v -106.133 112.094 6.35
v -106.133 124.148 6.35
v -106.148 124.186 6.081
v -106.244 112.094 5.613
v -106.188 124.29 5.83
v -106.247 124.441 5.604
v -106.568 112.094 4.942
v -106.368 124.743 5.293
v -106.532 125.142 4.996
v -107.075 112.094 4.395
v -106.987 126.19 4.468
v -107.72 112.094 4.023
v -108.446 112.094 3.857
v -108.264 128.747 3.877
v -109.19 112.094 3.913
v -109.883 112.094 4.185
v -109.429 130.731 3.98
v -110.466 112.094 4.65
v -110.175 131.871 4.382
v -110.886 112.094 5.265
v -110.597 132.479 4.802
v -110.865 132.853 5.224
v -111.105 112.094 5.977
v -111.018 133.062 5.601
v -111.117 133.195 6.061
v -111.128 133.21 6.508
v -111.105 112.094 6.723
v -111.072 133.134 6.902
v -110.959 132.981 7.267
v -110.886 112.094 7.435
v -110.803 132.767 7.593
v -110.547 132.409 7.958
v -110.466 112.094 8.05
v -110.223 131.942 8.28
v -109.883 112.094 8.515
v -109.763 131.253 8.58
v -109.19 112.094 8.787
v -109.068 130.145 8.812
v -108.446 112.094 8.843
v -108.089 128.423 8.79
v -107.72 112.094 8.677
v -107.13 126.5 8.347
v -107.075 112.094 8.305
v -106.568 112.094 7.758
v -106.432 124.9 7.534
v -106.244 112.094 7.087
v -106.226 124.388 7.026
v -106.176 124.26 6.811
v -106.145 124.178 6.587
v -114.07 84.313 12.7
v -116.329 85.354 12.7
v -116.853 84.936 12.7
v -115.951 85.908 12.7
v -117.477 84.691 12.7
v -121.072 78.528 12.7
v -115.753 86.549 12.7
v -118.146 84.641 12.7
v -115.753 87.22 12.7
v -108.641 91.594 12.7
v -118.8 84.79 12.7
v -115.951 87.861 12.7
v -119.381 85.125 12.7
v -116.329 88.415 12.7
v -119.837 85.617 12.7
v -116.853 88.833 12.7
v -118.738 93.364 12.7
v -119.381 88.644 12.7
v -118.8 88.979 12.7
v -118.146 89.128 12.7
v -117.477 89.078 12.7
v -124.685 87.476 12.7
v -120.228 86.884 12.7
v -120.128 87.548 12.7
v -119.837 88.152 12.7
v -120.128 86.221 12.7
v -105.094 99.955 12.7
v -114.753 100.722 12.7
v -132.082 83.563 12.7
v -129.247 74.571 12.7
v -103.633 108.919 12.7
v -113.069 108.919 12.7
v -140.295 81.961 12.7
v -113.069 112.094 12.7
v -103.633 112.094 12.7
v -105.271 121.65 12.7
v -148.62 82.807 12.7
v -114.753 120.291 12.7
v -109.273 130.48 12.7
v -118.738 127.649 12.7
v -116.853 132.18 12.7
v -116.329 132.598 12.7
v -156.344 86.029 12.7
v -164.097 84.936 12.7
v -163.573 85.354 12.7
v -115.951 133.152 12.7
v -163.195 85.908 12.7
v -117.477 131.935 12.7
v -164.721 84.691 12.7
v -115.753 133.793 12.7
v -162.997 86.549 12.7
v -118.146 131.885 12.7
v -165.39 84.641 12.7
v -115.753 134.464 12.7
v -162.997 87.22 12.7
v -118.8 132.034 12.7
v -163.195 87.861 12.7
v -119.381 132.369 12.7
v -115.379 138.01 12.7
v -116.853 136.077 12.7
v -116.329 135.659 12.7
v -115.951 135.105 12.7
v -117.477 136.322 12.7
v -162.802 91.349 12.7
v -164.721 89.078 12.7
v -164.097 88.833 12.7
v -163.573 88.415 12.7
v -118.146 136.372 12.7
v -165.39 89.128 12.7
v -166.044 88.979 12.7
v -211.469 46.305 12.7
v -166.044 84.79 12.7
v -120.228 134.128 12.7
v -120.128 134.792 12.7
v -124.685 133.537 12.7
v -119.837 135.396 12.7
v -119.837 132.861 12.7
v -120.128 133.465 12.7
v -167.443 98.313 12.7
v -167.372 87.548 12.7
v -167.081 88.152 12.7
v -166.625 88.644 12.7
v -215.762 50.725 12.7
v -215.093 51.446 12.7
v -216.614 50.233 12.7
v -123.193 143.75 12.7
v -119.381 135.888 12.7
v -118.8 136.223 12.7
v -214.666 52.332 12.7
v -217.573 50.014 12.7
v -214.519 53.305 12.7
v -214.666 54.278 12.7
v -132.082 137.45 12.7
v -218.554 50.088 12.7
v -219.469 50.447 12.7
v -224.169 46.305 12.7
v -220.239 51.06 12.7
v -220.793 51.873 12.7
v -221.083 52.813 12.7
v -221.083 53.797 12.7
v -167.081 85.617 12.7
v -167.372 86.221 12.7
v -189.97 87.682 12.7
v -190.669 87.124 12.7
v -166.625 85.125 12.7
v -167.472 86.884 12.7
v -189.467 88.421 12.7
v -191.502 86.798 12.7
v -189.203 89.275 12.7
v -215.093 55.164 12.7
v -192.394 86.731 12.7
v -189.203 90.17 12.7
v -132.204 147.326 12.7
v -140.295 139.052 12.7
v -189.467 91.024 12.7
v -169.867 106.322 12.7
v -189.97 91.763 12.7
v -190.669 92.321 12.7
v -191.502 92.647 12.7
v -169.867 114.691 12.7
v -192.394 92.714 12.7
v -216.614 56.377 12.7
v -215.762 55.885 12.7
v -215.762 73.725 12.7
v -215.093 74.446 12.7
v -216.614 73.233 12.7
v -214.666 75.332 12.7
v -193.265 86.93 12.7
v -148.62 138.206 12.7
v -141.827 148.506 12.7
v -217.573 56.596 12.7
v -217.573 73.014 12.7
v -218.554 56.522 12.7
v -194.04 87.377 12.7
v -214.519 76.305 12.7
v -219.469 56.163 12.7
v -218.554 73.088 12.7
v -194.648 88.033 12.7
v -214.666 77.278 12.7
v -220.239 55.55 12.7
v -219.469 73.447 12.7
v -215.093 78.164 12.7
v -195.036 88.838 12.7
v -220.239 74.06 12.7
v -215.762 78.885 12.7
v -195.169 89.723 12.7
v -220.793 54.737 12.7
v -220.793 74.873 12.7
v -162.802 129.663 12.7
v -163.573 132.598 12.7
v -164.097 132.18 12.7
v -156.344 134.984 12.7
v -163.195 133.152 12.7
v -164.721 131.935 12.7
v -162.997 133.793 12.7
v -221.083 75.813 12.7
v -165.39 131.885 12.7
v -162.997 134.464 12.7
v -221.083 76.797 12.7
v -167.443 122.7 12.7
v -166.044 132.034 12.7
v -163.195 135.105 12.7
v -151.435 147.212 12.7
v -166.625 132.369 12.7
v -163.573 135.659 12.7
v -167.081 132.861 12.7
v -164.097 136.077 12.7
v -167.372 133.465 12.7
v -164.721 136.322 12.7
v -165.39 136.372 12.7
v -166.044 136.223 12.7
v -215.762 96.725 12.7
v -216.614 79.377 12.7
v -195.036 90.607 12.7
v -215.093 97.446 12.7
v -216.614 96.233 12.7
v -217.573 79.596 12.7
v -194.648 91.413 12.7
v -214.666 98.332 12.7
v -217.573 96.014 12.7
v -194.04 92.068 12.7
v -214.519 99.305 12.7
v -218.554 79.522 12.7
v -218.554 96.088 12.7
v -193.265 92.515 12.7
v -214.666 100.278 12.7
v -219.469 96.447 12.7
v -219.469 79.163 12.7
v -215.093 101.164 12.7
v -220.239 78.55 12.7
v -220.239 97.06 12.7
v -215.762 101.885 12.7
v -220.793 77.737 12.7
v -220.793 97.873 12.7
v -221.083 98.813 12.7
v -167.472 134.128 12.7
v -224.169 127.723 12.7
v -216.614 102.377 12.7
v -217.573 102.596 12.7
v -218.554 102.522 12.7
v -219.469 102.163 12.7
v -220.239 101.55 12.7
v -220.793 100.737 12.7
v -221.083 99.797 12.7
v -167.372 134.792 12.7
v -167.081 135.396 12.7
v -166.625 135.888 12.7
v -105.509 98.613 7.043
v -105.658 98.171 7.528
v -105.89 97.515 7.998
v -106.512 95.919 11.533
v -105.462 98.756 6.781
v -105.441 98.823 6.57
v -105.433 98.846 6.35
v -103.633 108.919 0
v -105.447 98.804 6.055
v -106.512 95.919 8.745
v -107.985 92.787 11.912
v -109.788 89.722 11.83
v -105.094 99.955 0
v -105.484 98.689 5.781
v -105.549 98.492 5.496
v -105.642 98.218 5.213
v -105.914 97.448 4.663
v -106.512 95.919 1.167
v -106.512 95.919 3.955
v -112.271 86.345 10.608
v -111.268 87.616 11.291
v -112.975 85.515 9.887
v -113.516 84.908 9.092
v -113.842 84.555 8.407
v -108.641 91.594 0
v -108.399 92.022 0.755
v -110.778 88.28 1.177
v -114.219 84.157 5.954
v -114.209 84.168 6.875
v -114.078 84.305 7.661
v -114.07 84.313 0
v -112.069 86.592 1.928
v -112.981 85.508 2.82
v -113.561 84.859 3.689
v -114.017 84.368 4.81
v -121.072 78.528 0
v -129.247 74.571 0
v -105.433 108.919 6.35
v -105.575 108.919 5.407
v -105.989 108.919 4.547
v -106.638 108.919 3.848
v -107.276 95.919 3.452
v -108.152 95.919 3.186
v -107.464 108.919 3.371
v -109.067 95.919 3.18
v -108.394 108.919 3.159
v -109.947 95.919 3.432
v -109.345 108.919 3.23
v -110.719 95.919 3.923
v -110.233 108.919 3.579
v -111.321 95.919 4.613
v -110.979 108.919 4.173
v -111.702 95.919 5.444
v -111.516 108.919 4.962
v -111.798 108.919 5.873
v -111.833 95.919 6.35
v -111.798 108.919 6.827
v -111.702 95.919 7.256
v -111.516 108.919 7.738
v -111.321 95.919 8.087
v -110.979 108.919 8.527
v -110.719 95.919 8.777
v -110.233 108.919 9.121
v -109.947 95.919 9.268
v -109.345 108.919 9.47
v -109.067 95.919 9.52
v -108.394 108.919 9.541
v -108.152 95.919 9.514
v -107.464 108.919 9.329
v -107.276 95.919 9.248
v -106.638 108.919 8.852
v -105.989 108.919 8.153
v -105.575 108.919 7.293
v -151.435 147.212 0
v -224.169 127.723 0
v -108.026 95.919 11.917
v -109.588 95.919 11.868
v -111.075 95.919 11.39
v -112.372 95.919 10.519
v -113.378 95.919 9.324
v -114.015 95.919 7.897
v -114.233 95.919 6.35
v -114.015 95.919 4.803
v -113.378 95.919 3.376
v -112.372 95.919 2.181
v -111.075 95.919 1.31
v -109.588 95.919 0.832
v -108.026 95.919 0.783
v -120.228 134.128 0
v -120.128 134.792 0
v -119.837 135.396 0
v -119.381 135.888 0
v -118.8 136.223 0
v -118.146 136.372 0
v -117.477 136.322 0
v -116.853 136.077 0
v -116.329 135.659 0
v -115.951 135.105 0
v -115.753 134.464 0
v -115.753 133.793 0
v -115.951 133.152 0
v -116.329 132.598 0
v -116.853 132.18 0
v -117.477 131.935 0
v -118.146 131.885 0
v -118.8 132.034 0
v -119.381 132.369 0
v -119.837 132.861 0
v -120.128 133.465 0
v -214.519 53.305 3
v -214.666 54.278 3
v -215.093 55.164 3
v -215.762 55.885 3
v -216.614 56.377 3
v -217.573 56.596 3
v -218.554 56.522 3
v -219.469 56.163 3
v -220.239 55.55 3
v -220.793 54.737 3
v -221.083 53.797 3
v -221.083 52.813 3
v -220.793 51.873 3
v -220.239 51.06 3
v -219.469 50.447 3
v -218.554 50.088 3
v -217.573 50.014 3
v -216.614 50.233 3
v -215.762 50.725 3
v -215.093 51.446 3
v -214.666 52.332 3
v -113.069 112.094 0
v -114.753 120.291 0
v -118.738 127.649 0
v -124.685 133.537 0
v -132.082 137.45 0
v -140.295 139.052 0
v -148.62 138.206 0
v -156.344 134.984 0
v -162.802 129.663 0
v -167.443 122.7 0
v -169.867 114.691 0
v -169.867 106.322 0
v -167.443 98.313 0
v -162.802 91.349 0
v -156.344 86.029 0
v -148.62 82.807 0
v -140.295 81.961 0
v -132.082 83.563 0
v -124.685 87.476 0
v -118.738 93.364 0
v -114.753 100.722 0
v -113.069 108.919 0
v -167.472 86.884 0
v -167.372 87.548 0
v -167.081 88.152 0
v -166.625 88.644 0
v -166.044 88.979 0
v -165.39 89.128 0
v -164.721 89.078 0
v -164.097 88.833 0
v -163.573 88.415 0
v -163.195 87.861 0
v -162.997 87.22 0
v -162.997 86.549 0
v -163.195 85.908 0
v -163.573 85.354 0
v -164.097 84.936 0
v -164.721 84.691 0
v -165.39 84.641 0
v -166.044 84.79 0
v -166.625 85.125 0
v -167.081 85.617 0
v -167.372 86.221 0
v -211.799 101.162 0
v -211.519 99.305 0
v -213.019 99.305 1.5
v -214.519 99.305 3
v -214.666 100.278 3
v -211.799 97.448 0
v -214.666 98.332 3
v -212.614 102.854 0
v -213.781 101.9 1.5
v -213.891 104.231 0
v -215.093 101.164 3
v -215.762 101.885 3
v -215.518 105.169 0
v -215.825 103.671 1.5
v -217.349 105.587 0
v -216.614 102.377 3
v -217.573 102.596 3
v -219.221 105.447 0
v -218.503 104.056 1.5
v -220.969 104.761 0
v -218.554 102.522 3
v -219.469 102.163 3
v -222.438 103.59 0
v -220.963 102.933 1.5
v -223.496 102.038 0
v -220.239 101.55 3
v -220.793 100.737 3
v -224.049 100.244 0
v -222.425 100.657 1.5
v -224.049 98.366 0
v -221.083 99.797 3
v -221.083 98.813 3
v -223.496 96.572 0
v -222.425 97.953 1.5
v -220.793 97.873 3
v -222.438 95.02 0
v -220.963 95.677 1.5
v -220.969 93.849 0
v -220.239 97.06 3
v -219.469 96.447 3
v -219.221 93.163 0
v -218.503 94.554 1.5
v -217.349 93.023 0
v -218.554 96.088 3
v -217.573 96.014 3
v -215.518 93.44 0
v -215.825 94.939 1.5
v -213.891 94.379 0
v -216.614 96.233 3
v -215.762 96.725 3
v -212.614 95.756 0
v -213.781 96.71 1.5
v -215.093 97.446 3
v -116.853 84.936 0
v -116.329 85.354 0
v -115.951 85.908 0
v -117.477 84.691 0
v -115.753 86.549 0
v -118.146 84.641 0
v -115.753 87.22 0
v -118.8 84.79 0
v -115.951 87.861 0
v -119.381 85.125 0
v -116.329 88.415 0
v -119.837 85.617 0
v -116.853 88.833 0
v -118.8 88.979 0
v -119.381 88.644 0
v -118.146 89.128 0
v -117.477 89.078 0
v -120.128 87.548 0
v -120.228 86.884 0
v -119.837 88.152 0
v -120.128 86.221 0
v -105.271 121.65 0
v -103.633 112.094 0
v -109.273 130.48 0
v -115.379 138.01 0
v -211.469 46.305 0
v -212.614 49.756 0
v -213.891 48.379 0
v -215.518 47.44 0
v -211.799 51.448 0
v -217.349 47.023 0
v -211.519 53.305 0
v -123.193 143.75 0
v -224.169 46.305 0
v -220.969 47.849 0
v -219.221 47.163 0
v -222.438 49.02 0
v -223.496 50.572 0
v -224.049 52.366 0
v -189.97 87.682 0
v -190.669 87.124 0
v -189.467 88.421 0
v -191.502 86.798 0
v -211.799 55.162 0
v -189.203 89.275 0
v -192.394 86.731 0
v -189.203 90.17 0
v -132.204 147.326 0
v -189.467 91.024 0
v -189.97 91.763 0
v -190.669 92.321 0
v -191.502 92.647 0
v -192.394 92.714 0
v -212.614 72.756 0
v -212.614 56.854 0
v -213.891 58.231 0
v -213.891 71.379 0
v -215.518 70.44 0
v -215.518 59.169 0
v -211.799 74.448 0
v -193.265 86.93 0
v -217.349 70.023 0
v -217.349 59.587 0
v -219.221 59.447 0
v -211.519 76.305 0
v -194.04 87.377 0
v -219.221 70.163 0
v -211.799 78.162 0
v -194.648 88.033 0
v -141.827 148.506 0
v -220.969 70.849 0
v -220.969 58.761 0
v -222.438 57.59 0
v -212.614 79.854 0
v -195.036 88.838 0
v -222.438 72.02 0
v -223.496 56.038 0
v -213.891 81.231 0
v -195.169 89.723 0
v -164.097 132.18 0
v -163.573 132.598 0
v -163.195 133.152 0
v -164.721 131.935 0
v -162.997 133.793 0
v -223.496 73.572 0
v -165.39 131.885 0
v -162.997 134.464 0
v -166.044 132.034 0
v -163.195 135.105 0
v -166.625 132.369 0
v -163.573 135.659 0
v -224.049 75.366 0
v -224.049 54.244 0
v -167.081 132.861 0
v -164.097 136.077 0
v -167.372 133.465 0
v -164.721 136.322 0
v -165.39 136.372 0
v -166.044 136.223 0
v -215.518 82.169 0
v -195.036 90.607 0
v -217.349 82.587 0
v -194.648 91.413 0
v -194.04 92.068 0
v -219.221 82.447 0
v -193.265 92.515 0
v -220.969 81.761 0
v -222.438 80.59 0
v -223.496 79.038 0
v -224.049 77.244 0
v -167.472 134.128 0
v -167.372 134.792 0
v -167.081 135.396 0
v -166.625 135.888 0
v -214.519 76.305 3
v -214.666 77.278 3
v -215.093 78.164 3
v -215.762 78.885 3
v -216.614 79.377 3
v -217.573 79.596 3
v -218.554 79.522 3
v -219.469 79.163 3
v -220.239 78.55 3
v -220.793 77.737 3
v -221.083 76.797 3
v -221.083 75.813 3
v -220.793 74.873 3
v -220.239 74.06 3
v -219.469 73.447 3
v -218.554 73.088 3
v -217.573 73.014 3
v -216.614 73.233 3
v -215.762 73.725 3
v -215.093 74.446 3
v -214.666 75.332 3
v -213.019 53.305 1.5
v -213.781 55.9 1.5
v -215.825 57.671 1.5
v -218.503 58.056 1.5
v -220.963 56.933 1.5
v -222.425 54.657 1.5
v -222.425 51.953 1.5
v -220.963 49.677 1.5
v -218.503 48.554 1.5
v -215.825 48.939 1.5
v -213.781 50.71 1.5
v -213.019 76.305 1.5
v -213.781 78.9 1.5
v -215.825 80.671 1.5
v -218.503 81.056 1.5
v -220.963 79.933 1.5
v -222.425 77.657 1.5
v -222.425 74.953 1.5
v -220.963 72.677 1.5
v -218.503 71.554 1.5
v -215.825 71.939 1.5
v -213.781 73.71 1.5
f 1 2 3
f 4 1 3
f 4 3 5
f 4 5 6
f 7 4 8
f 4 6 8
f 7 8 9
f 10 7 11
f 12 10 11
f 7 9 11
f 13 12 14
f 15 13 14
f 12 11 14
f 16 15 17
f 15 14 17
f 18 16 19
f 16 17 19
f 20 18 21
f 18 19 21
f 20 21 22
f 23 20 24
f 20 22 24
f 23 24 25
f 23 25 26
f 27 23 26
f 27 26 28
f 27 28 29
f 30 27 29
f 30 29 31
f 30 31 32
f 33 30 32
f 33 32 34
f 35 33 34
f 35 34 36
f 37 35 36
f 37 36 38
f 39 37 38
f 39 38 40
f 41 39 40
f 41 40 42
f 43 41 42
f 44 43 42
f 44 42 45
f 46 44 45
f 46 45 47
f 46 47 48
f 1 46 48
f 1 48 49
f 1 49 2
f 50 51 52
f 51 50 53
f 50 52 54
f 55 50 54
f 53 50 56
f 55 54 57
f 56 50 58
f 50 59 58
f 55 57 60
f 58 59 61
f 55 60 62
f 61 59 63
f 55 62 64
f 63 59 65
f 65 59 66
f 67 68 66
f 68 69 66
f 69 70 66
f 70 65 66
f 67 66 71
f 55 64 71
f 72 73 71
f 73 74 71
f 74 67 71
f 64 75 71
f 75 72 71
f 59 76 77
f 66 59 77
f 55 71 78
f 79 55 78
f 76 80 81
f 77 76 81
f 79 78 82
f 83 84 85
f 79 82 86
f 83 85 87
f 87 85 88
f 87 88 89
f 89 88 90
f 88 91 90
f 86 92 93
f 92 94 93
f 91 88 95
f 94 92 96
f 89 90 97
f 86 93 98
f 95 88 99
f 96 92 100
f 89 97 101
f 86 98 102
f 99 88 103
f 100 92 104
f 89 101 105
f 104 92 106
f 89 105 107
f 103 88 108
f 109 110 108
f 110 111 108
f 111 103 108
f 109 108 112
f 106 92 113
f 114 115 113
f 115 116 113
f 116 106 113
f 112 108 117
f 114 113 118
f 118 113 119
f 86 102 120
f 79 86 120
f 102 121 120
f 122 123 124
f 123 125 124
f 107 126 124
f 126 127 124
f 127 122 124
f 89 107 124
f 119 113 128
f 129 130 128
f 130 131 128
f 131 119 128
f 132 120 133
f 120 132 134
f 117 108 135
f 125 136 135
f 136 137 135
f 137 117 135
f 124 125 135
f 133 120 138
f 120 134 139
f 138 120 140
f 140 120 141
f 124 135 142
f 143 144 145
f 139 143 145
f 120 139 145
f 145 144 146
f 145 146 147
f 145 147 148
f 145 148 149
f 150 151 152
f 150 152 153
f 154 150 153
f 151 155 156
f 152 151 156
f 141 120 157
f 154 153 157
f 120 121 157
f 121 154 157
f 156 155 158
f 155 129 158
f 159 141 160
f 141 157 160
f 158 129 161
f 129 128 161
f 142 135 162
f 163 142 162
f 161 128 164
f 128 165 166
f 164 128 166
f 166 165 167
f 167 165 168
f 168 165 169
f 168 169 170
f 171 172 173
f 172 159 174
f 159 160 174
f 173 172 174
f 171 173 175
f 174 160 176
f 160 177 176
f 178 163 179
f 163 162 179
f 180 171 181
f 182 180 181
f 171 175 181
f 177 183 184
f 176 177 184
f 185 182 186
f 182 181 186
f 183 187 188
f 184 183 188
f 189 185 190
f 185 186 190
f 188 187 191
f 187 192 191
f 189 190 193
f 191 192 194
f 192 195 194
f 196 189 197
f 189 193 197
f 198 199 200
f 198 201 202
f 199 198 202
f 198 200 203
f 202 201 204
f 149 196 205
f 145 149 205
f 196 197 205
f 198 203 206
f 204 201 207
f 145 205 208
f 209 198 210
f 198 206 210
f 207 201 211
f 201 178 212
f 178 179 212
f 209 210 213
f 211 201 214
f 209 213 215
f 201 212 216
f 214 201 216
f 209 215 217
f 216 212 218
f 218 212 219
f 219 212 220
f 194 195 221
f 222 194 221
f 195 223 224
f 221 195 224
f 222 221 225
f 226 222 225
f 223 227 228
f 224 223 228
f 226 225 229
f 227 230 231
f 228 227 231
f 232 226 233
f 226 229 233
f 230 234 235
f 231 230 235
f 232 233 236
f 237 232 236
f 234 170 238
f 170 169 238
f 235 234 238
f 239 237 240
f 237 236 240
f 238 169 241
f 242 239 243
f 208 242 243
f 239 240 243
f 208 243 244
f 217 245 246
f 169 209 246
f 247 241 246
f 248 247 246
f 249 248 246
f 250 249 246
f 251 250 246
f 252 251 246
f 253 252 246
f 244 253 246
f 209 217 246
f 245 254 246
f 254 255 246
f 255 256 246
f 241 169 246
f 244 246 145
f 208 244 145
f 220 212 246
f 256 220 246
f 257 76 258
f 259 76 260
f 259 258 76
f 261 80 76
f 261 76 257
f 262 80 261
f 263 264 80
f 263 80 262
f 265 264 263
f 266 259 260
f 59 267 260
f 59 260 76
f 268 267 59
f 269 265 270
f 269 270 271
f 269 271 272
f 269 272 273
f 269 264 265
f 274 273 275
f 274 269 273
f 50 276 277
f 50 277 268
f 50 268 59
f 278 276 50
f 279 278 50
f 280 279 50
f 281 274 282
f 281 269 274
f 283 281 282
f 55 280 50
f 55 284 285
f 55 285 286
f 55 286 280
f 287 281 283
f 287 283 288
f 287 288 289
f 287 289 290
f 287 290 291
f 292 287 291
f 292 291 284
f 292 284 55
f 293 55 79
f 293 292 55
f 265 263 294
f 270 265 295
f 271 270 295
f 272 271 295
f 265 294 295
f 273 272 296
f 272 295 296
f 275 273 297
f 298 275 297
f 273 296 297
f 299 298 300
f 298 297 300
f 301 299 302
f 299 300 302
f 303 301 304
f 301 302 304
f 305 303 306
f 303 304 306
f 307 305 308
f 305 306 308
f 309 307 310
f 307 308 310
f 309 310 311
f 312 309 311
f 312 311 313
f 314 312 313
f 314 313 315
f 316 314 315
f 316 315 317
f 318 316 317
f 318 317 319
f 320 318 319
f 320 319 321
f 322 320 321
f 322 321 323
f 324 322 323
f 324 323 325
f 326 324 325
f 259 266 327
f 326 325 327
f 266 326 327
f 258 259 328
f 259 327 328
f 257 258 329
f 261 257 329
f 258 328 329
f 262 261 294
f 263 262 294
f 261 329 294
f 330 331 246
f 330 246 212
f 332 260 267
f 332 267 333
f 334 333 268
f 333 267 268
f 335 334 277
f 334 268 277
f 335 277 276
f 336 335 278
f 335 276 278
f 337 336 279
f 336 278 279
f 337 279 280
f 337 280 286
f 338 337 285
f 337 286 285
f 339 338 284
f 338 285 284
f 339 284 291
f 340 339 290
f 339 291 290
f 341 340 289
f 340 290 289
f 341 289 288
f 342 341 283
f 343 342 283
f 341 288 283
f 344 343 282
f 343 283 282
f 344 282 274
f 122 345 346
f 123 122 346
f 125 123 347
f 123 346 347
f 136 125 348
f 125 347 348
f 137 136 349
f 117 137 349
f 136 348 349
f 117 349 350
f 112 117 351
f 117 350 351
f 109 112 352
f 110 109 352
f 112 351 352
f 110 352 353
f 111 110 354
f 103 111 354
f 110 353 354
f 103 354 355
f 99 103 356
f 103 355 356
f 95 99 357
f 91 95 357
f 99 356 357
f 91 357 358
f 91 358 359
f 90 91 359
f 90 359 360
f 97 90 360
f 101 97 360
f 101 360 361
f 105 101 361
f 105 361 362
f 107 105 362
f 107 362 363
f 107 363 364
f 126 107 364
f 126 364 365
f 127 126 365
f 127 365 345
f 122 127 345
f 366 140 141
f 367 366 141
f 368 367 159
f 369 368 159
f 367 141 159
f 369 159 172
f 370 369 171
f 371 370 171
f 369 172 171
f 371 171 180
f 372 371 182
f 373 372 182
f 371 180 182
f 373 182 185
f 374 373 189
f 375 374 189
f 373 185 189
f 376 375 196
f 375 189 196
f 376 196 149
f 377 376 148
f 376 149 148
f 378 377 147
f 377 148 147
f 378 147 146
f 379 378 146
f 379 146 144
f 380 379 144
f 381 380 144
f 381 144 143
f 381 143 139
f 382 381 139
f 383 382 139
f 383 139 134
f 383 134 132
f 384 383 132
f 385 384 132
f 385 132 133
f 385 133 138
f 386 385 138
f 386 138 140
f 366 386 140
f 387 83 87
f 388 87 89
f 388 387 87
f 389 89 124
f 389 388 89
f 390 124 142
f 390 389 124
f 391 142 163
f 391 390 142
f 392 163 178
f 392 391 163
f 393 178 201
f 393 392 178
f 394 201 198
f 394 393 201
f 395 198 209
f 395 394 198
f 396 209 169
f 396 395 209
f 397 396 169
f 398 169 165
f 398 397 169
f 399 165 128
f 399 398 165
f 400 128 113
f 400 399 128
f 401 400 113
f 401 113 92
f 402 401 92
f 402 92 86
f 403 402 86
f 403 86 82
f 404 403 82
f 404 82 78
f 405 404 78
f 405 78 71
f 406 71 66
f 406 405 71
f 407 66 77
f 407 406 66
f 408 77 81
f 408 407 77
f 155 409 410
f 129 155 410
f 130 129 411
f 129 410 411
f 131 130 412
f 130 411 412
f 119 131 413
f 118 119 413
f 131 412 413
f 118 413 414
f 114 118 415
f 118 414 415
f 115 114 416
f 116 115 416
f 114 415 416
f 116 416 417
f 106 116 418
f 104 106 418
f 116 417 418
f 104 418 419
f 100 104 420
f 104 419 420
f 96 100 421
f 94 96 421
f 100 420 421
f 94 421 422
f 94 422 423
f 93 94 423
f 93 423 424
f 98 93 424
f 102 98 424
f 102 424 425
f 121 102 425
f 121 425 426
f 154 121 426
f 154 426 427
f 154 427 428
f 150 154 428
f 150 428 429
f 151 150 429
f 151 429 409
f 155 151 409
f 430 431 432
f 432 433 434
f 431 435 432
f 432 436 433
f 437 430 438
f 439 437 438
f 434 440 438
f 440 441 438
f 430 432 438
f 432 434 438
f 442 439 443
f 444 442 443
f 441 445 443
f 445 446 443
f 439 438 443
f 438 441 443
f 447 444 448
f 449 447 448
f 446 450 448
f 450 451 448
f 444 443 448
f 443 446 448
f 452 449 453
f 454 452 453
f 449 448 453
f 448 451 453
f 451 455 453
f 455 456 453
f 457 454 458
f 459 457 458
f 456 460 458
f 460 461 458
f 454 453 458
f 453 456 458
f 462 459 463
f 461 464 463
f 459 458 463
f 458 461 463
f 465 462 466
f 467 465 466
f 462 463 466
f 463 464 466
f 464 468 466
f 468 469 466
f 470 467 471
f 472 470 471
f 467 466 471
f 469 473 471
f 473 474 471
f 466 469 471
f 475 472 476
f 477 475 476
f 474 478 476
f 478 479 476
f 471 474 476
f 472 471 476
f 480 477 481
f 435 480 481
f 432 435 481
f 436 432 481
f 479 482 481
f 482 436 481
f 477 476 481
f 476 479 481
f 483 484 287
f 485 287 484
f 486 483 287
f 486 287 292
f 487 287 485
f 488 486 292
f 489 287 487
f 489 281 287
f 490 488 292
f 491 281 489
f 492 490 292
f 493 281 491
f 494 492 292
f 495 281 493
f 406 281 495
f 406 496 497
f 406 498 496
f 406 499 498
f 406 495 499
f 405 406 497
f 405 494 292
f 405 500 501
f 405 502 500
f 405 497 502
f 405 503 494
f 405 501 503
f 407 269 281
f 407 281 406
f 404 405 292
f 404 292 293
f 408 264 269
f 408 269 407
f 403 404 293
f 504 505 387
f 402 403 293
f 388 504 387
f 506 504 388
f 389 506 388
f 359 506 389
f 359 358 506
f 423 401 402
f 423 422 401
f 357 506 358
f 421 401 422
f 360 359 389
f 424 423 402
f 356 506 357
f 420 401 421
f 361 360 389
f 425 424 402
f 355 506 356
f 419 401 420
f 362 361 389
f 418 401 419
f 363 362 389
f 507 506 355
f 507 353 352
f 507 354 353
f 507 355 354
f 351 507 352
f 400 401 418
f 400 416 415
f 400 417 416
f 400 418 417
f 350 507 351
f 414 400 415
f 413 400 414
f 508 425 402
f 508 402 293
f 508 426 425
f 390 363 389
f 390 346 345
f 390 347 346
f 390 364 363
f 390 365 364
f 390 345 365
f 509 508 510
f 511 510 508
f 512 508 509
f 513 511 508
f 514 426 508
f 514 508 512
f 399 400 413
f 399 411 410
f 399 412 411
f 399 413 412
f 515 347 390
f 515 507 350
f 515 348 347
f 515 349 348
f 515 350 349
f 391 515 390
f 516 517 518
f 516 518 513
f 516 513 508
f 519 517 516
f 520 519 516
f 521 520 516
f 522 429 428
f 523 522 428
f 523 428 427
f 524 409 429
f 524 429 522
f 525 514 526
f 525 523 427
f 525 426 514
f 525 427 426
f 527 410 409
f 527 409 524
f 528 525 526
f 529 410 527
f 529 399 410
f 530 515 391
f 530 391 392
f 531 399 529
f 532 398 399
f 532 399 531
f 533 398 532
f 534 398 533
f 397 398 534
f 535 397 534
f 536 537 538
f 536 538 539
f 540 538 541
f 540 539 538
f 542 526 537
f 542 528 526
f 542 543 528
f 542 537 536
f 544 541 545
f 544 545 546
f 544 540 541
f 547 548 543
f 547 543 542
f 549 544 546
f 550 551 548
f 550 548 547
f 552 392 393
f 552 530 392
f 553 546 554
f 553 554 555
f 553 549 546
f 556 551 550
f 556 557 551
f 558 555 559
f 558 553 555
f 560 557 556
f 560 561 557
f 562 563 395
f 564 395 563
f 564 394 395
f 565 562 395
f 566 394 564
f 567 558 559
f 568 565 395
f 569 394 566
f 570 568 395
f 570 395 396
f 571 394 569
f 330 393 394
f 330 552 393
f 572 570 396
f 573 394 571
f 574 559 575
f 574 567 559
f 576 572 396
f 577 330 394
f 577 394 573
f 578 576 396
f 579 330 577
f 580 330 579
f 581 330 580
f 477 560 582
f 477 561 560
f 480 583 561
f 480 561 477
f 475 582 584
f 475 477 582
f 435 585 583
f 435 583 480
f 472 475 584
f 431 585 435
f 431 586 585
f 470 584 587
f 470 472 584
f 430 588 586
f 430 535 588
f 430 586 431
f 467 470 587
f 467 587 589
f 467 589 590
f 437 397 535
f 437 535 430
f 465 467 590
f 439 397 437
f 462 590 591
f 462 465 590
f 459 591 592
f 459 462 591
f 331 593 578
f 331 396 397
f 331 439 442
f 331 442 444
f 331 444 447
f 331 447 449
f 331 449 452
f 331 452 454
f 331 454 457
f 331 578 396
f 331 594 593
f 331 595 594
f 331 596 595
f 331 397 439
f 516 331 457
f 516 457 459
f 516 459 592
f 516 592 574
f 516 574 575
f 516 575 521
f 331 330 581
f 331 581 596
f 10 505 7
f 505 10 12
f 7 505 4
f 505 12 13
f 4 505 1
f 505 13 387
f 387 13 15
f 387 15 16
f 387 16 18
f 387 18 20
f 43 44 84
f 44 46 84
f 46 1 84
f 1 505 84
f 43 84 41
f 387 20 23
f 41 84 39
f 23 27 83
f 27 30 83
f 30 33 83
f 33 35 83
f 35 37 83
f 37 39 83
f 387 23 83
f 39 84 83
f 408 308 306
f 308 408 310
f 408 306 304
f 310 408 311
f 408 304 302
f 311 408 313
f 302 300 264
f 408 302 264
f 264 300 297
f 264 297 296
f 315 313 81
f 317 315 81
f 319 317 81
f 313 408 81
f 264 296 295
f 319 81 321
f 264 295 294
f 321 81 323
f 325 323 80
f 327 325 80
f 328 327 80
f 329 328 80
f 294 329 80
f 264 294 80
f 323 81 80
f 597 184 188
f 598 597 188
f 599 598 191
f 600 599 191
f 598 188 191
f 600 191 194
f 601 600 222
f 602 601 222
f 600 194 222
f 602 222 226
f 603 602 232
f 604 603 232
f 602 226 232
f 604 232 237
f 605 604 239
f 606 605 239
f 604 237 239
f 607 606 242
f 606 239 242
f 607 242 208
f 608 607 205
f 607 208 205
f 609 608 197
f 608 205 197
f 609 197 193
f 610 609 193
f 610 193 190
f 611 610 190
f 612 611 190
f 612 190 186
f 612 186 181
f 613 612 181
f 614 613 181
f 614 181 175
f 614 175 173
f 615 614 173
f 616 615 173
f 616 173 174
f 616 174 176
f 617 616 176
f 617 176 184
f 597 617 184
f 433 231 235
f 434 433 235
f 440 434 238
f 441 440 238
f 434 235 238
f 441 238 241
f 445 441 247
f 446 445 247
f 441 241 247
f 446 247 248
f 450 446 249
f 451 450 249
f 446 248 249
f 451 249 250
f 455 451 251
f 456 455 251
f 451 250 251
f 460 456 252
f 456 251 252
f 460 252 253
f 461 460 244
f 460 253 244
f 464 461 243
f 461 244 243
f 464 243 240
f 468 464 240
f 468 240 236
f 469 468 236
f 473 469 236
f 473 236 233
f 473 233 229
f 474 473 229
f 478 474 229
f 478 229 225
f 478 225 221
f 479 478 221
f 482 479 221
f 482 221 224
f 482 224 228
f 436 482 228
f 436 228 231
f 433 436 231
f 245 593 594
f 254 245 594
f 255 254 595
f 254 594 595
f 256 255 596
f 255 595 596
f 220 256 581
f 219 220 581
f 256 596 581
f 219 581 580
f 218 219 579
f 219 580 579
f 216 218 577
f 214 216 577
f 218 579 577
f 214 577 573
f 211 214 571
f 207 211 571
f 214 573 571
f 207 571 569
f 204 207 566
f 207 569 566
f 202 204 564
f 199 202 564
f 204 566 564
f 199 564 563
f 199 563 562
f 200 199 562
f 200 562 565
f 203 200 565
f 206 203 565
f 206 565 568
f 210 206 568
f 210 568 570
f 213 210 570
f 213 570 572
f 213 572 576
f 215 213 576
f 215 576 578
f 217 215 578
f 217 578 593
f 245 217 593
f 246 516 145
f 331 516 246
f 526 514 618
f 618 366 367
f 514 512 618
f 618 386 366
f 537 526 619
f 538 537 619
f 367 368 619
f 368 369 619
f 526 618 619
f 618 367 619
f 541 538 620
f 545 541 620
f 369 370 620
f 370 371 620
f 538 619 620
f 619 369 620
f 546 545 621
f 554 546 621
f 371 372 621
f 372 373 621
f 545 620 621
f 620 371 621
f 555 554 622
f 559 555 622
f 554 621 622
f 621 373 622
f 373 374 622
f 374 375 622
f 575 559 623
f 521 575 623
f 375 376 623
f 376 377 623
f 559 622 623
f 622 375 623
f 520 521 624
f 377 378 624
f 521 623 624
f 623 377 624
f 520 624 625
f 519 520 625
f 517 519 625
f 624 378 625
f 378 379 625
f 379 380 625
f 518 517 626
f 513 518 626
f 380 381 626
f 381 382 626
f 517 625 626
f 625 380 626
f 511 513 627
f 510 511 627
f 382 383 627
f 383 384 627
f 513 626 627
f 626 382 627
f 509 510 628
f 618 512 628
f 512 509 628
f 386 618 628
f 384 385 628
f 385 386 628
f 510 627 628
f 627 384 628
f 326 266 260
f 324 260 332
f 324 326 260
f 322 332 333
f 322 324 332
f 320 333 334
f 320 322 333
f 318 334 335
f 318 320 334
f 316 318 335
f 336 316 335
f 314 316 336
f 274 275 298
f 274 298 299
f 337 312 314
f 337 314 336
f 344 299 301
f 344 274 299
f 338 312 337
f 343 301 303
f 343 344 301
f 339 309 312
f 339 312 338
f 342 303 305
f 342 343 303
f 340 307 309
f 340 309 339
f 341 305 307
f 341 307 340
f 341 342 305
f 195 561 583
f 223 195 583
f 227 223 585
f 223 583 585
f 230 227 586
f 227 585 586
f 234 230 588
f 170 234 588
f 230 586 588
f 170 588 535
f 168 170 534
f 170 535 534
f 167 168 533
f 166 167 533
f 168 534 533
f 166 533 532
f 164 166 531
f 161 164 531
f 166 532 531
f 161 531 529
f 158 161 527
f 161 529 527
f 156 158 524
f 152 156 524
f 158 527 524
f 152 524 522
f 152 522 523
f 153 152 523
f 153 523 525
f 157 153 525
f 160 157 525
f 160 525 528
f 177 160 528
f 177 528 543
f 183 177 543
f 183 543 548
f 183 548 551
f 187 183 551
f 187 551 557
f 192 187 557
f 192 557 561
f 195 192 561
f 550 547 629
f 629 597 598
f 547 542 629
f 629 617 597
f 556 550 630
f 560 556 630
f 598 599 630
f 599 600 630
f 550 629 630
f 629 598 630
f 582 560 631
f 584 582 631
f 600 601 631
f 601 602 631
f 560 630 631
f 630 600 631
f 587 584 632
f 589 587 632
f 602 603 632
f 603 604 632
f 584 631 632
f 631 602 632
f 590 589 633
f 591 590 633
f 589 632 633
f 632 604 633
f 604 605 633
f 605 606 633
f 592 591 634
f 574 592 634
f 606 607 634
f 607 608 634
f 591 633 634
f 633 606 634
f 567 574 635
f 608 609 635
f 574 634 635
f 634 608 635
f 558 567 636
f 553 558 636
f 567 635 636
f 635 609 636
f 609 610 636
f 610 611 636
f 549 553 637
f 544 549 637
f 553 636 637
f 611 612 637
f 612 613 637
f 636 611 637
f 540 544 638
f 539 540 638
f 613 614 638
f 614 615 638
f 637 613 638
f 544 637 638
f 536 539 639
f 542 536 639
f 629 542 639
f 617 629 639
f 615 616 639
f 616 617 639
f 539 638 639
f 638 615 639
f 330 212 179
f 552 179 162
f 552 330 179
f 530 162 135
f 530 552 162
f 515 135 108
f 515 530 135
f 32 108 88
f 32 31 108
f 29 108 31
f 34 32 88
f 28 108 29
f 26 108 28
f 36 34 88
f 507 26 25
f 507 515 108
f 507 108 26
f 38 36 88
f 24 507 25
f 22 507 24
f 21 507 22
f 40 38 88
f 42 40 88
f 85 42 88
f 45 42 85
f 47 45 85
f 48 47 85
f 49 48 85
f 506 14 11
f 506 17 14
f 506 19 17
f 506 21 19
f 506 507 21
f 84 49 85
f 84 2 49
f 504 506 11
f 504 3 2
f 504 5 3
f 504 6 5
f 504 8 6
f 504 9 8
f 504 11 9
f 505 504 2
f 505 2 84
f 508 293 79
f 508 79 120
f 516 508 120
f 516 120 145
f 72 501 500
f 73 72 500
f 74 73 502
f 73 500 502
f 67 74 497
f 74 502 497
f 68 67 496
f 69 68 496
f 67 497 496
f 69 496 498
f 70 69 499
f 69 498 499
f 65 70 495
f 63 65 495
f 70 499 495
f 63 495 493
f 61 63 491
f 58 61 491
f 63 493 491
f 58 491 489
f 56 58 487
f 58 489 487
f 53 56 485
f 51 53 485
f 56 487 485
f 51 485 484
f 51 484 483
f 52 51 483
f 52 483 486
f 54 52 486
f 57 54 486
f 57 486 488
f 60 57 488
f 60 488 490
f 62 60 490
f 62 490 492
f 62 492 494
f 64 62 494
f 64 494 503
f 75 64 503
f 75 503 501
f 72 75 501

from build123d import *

# Parameters (mm, degrees)
BOSS_EXTRUDE1_DEPTH         = 12.7
CUT_EXTRUDE1_DEPTH          = 13.7
SKETCH3_W                   = 28.575
SKETCH3_H                   = 12.7
F_8_CLEARANCE_HOLE1_D       = 4.5
F_8_CLEARANCE_HOLE1_DEPTH   = 12.7
F_1_4_CLEARANCE_HOLE1_D     = 6.6
F_1_4_CLEARANCE_HOLE1_DEPTH = 12.7
F_12_CLEARANCE_HOLE1_D      = 6
F_12_CLEARANCE_HOLE1_DEPTH  = 12.7
HOLE1_D                     = 6.4
HOLE1_DEPTH                 = 24.77643101
HOLE1_CBORE_D               = 11.2
HOLE1_CBORE_DEPTH           = 11.77643101
F_10_CLEARANCE_HOLE1_D      = 5
F_10_CLEARANCE_HOLE1_DEPTH  = 36.4125
CHAMFER1_SIZE               = 3
SKETCH14_R                  = 4
SKETCH14_R_2                = 3
BOSS_EXTRUDE2_DEPTH         = 12.7


with BuildPart() as part:
    # Sketch1 → Boss-Extrude1 (new body)
    with BuildSketch(Plane(origin=(0, 0, 0), x_dir=(-1, 0, 0), z_dir=(0, 0, -1))):
        with BuildLine():
            Line((224.169455465, 127.72254562), (151.435240745, 147.211619716))
            ThreePointArc((151.435240745, 147.211619716), (105.257753851, 121.607458019), (129.246532787, 74.570537656))
            Line((129.246532787, 74.570537656), (211.469455465, 46.304993078))
            Line((211.469455465, 46.304993078), (224.169455465, 46.304993078))
            Line((224.169455465, 46.304993078), (224.169455465, 127.72254562))
        make_face()
    extrude(amount=-BOSS_EXTRUDE1_DEPTH)

    # Sketch2 → Cut-Extrude1 (cut, through all)
    with BuildSketch(Plane.XY.offset(12.7)):
        with BuildLine():
            Line((-103.633291463, 112.093938317), (-113.179018515, 112.093938317))
            ThreePointArc((-113.179018515, 112.093938317), (-113.134717032, 110.506438317), (-113.179018515, 108.918938317))
            Line((-113.179018515, 108.918938317), (-103.633291463, 108.918938317))
            ThreePointArc((-103.633291463, 108.918938317), (-103.600117032, 110.506438317), (-103.633291463, 112.093938317))
        make_face()
    extrude(amount=-CUT_EXTRUDE1_DEPTH, mode=Mode.SUBTRACT)

    # Sketch3 → Cut-Revolve1 (revolve, cut)
    with BuildSketch(Plane(origin=(0, 110.506438317, 0), x_dir=(1, 0, 0), z_dir=(0, 1, 0))):
        with Locations((-127.312617032, -6.35)):
            Rectangle(SKETCH3_W, SKETCH3_H)
    revolve(axis=Axis((-141.600117032, 110.506438317, 0), (0, 0, 1)), mode=Mode.SUBTRACT)

    # #8 Clearance Hole1
    with Locations(Plane.XY.offset(12.7)):
        with Locations((-117.978117032, 86.884438317), (-165.222117032, 86.884438317), (-165.222117032, 134.128438317), (-117.978117032, 134.128438317)):
            Hole(F_8_CLEARANCE_HOLE1_D / 2, depth=F_8_CLEARANCE_HOLE1_DEPTH)

    # 1/4 Clearance Hole1
    with Locations(Plane(origin=(0, 0, 0), x_dir=(-1, 0, 0), z_dir=(0, 0, -1))):
        with Locations((217.819455465, 53.304993078), (217.819455465, 76.304993078), (217.819455465, 99.304993078)):
            Hole(F_1_4_CLEARANCE_HOLE1_D / 2, depth=F_1_4_CLEARANCE_HOLE1_DEPTH)

    # #12 Clearance Hole1
    with Locations(Plane.XY.offset(12.7)):
        with Locations((-192.169455465, 89.72254562)):
            Hole(F_12_CLEARANCE_HOLE1_D / 2, depth=F_12_CLEARANCE_HOLE1_DEPTH)

    # Hole1
    with Locations(Plane(origin=(0, 84.142507307, 0), x_dir=(-1, 0, 0), z_dir=(0, -1, 0))):
        with Locations((108.633291463, -6.35)):
            CounterBoreHole(HOLE1_D / 2, HOLE1_CBORE_D / 2, HOLE1_CBORE_DEPTH, depth=HOLE1_DEPTH)

    # #10 Clearance Hole1
    with Locations(Plane(origin=(0, 112.093938317, 0), x_dir=(-1, 0, 0), z_dir=(0, -1, 0))):
        with Locations((108.633291463, -6.35)):
            Hole(F_10_CLEARANCE_HOLE1_D / 2, depth=F_10_CLEARANCE_HOLE1_DEPTH)

    # Chamfer1
    chamfer1_edges = [part.edges().sort_by_distance(p)[0] for p in [
        (-221.119455465, 99.304993078, 0),
        (-221.119455465, 76.304993078, 0),
        (-221.119455465, 53.304993078, 0),
    ]]
    chamfer(chamfer1_edges, length=CHAMFER1_SIZE)

    # Sketch14 → Boss-Extrude2 (add)
    with BuildSketch(Plane(origin=(0, 0, 0), x_dir=(-1, 0, 0), z_dir=(0, 0, -1))):
        with Locations((192.169455465, 89.72254562)):
            Circle(SKETCH14_R)
        with Locations((192.169455465, 89.72254562)):
            Circle(SKETCH14_R_2, mode=Mode.SUBTRACT)
    extrude(amount=-BOSS_EXTRUDE2_DEPTH)


solid = part.part
